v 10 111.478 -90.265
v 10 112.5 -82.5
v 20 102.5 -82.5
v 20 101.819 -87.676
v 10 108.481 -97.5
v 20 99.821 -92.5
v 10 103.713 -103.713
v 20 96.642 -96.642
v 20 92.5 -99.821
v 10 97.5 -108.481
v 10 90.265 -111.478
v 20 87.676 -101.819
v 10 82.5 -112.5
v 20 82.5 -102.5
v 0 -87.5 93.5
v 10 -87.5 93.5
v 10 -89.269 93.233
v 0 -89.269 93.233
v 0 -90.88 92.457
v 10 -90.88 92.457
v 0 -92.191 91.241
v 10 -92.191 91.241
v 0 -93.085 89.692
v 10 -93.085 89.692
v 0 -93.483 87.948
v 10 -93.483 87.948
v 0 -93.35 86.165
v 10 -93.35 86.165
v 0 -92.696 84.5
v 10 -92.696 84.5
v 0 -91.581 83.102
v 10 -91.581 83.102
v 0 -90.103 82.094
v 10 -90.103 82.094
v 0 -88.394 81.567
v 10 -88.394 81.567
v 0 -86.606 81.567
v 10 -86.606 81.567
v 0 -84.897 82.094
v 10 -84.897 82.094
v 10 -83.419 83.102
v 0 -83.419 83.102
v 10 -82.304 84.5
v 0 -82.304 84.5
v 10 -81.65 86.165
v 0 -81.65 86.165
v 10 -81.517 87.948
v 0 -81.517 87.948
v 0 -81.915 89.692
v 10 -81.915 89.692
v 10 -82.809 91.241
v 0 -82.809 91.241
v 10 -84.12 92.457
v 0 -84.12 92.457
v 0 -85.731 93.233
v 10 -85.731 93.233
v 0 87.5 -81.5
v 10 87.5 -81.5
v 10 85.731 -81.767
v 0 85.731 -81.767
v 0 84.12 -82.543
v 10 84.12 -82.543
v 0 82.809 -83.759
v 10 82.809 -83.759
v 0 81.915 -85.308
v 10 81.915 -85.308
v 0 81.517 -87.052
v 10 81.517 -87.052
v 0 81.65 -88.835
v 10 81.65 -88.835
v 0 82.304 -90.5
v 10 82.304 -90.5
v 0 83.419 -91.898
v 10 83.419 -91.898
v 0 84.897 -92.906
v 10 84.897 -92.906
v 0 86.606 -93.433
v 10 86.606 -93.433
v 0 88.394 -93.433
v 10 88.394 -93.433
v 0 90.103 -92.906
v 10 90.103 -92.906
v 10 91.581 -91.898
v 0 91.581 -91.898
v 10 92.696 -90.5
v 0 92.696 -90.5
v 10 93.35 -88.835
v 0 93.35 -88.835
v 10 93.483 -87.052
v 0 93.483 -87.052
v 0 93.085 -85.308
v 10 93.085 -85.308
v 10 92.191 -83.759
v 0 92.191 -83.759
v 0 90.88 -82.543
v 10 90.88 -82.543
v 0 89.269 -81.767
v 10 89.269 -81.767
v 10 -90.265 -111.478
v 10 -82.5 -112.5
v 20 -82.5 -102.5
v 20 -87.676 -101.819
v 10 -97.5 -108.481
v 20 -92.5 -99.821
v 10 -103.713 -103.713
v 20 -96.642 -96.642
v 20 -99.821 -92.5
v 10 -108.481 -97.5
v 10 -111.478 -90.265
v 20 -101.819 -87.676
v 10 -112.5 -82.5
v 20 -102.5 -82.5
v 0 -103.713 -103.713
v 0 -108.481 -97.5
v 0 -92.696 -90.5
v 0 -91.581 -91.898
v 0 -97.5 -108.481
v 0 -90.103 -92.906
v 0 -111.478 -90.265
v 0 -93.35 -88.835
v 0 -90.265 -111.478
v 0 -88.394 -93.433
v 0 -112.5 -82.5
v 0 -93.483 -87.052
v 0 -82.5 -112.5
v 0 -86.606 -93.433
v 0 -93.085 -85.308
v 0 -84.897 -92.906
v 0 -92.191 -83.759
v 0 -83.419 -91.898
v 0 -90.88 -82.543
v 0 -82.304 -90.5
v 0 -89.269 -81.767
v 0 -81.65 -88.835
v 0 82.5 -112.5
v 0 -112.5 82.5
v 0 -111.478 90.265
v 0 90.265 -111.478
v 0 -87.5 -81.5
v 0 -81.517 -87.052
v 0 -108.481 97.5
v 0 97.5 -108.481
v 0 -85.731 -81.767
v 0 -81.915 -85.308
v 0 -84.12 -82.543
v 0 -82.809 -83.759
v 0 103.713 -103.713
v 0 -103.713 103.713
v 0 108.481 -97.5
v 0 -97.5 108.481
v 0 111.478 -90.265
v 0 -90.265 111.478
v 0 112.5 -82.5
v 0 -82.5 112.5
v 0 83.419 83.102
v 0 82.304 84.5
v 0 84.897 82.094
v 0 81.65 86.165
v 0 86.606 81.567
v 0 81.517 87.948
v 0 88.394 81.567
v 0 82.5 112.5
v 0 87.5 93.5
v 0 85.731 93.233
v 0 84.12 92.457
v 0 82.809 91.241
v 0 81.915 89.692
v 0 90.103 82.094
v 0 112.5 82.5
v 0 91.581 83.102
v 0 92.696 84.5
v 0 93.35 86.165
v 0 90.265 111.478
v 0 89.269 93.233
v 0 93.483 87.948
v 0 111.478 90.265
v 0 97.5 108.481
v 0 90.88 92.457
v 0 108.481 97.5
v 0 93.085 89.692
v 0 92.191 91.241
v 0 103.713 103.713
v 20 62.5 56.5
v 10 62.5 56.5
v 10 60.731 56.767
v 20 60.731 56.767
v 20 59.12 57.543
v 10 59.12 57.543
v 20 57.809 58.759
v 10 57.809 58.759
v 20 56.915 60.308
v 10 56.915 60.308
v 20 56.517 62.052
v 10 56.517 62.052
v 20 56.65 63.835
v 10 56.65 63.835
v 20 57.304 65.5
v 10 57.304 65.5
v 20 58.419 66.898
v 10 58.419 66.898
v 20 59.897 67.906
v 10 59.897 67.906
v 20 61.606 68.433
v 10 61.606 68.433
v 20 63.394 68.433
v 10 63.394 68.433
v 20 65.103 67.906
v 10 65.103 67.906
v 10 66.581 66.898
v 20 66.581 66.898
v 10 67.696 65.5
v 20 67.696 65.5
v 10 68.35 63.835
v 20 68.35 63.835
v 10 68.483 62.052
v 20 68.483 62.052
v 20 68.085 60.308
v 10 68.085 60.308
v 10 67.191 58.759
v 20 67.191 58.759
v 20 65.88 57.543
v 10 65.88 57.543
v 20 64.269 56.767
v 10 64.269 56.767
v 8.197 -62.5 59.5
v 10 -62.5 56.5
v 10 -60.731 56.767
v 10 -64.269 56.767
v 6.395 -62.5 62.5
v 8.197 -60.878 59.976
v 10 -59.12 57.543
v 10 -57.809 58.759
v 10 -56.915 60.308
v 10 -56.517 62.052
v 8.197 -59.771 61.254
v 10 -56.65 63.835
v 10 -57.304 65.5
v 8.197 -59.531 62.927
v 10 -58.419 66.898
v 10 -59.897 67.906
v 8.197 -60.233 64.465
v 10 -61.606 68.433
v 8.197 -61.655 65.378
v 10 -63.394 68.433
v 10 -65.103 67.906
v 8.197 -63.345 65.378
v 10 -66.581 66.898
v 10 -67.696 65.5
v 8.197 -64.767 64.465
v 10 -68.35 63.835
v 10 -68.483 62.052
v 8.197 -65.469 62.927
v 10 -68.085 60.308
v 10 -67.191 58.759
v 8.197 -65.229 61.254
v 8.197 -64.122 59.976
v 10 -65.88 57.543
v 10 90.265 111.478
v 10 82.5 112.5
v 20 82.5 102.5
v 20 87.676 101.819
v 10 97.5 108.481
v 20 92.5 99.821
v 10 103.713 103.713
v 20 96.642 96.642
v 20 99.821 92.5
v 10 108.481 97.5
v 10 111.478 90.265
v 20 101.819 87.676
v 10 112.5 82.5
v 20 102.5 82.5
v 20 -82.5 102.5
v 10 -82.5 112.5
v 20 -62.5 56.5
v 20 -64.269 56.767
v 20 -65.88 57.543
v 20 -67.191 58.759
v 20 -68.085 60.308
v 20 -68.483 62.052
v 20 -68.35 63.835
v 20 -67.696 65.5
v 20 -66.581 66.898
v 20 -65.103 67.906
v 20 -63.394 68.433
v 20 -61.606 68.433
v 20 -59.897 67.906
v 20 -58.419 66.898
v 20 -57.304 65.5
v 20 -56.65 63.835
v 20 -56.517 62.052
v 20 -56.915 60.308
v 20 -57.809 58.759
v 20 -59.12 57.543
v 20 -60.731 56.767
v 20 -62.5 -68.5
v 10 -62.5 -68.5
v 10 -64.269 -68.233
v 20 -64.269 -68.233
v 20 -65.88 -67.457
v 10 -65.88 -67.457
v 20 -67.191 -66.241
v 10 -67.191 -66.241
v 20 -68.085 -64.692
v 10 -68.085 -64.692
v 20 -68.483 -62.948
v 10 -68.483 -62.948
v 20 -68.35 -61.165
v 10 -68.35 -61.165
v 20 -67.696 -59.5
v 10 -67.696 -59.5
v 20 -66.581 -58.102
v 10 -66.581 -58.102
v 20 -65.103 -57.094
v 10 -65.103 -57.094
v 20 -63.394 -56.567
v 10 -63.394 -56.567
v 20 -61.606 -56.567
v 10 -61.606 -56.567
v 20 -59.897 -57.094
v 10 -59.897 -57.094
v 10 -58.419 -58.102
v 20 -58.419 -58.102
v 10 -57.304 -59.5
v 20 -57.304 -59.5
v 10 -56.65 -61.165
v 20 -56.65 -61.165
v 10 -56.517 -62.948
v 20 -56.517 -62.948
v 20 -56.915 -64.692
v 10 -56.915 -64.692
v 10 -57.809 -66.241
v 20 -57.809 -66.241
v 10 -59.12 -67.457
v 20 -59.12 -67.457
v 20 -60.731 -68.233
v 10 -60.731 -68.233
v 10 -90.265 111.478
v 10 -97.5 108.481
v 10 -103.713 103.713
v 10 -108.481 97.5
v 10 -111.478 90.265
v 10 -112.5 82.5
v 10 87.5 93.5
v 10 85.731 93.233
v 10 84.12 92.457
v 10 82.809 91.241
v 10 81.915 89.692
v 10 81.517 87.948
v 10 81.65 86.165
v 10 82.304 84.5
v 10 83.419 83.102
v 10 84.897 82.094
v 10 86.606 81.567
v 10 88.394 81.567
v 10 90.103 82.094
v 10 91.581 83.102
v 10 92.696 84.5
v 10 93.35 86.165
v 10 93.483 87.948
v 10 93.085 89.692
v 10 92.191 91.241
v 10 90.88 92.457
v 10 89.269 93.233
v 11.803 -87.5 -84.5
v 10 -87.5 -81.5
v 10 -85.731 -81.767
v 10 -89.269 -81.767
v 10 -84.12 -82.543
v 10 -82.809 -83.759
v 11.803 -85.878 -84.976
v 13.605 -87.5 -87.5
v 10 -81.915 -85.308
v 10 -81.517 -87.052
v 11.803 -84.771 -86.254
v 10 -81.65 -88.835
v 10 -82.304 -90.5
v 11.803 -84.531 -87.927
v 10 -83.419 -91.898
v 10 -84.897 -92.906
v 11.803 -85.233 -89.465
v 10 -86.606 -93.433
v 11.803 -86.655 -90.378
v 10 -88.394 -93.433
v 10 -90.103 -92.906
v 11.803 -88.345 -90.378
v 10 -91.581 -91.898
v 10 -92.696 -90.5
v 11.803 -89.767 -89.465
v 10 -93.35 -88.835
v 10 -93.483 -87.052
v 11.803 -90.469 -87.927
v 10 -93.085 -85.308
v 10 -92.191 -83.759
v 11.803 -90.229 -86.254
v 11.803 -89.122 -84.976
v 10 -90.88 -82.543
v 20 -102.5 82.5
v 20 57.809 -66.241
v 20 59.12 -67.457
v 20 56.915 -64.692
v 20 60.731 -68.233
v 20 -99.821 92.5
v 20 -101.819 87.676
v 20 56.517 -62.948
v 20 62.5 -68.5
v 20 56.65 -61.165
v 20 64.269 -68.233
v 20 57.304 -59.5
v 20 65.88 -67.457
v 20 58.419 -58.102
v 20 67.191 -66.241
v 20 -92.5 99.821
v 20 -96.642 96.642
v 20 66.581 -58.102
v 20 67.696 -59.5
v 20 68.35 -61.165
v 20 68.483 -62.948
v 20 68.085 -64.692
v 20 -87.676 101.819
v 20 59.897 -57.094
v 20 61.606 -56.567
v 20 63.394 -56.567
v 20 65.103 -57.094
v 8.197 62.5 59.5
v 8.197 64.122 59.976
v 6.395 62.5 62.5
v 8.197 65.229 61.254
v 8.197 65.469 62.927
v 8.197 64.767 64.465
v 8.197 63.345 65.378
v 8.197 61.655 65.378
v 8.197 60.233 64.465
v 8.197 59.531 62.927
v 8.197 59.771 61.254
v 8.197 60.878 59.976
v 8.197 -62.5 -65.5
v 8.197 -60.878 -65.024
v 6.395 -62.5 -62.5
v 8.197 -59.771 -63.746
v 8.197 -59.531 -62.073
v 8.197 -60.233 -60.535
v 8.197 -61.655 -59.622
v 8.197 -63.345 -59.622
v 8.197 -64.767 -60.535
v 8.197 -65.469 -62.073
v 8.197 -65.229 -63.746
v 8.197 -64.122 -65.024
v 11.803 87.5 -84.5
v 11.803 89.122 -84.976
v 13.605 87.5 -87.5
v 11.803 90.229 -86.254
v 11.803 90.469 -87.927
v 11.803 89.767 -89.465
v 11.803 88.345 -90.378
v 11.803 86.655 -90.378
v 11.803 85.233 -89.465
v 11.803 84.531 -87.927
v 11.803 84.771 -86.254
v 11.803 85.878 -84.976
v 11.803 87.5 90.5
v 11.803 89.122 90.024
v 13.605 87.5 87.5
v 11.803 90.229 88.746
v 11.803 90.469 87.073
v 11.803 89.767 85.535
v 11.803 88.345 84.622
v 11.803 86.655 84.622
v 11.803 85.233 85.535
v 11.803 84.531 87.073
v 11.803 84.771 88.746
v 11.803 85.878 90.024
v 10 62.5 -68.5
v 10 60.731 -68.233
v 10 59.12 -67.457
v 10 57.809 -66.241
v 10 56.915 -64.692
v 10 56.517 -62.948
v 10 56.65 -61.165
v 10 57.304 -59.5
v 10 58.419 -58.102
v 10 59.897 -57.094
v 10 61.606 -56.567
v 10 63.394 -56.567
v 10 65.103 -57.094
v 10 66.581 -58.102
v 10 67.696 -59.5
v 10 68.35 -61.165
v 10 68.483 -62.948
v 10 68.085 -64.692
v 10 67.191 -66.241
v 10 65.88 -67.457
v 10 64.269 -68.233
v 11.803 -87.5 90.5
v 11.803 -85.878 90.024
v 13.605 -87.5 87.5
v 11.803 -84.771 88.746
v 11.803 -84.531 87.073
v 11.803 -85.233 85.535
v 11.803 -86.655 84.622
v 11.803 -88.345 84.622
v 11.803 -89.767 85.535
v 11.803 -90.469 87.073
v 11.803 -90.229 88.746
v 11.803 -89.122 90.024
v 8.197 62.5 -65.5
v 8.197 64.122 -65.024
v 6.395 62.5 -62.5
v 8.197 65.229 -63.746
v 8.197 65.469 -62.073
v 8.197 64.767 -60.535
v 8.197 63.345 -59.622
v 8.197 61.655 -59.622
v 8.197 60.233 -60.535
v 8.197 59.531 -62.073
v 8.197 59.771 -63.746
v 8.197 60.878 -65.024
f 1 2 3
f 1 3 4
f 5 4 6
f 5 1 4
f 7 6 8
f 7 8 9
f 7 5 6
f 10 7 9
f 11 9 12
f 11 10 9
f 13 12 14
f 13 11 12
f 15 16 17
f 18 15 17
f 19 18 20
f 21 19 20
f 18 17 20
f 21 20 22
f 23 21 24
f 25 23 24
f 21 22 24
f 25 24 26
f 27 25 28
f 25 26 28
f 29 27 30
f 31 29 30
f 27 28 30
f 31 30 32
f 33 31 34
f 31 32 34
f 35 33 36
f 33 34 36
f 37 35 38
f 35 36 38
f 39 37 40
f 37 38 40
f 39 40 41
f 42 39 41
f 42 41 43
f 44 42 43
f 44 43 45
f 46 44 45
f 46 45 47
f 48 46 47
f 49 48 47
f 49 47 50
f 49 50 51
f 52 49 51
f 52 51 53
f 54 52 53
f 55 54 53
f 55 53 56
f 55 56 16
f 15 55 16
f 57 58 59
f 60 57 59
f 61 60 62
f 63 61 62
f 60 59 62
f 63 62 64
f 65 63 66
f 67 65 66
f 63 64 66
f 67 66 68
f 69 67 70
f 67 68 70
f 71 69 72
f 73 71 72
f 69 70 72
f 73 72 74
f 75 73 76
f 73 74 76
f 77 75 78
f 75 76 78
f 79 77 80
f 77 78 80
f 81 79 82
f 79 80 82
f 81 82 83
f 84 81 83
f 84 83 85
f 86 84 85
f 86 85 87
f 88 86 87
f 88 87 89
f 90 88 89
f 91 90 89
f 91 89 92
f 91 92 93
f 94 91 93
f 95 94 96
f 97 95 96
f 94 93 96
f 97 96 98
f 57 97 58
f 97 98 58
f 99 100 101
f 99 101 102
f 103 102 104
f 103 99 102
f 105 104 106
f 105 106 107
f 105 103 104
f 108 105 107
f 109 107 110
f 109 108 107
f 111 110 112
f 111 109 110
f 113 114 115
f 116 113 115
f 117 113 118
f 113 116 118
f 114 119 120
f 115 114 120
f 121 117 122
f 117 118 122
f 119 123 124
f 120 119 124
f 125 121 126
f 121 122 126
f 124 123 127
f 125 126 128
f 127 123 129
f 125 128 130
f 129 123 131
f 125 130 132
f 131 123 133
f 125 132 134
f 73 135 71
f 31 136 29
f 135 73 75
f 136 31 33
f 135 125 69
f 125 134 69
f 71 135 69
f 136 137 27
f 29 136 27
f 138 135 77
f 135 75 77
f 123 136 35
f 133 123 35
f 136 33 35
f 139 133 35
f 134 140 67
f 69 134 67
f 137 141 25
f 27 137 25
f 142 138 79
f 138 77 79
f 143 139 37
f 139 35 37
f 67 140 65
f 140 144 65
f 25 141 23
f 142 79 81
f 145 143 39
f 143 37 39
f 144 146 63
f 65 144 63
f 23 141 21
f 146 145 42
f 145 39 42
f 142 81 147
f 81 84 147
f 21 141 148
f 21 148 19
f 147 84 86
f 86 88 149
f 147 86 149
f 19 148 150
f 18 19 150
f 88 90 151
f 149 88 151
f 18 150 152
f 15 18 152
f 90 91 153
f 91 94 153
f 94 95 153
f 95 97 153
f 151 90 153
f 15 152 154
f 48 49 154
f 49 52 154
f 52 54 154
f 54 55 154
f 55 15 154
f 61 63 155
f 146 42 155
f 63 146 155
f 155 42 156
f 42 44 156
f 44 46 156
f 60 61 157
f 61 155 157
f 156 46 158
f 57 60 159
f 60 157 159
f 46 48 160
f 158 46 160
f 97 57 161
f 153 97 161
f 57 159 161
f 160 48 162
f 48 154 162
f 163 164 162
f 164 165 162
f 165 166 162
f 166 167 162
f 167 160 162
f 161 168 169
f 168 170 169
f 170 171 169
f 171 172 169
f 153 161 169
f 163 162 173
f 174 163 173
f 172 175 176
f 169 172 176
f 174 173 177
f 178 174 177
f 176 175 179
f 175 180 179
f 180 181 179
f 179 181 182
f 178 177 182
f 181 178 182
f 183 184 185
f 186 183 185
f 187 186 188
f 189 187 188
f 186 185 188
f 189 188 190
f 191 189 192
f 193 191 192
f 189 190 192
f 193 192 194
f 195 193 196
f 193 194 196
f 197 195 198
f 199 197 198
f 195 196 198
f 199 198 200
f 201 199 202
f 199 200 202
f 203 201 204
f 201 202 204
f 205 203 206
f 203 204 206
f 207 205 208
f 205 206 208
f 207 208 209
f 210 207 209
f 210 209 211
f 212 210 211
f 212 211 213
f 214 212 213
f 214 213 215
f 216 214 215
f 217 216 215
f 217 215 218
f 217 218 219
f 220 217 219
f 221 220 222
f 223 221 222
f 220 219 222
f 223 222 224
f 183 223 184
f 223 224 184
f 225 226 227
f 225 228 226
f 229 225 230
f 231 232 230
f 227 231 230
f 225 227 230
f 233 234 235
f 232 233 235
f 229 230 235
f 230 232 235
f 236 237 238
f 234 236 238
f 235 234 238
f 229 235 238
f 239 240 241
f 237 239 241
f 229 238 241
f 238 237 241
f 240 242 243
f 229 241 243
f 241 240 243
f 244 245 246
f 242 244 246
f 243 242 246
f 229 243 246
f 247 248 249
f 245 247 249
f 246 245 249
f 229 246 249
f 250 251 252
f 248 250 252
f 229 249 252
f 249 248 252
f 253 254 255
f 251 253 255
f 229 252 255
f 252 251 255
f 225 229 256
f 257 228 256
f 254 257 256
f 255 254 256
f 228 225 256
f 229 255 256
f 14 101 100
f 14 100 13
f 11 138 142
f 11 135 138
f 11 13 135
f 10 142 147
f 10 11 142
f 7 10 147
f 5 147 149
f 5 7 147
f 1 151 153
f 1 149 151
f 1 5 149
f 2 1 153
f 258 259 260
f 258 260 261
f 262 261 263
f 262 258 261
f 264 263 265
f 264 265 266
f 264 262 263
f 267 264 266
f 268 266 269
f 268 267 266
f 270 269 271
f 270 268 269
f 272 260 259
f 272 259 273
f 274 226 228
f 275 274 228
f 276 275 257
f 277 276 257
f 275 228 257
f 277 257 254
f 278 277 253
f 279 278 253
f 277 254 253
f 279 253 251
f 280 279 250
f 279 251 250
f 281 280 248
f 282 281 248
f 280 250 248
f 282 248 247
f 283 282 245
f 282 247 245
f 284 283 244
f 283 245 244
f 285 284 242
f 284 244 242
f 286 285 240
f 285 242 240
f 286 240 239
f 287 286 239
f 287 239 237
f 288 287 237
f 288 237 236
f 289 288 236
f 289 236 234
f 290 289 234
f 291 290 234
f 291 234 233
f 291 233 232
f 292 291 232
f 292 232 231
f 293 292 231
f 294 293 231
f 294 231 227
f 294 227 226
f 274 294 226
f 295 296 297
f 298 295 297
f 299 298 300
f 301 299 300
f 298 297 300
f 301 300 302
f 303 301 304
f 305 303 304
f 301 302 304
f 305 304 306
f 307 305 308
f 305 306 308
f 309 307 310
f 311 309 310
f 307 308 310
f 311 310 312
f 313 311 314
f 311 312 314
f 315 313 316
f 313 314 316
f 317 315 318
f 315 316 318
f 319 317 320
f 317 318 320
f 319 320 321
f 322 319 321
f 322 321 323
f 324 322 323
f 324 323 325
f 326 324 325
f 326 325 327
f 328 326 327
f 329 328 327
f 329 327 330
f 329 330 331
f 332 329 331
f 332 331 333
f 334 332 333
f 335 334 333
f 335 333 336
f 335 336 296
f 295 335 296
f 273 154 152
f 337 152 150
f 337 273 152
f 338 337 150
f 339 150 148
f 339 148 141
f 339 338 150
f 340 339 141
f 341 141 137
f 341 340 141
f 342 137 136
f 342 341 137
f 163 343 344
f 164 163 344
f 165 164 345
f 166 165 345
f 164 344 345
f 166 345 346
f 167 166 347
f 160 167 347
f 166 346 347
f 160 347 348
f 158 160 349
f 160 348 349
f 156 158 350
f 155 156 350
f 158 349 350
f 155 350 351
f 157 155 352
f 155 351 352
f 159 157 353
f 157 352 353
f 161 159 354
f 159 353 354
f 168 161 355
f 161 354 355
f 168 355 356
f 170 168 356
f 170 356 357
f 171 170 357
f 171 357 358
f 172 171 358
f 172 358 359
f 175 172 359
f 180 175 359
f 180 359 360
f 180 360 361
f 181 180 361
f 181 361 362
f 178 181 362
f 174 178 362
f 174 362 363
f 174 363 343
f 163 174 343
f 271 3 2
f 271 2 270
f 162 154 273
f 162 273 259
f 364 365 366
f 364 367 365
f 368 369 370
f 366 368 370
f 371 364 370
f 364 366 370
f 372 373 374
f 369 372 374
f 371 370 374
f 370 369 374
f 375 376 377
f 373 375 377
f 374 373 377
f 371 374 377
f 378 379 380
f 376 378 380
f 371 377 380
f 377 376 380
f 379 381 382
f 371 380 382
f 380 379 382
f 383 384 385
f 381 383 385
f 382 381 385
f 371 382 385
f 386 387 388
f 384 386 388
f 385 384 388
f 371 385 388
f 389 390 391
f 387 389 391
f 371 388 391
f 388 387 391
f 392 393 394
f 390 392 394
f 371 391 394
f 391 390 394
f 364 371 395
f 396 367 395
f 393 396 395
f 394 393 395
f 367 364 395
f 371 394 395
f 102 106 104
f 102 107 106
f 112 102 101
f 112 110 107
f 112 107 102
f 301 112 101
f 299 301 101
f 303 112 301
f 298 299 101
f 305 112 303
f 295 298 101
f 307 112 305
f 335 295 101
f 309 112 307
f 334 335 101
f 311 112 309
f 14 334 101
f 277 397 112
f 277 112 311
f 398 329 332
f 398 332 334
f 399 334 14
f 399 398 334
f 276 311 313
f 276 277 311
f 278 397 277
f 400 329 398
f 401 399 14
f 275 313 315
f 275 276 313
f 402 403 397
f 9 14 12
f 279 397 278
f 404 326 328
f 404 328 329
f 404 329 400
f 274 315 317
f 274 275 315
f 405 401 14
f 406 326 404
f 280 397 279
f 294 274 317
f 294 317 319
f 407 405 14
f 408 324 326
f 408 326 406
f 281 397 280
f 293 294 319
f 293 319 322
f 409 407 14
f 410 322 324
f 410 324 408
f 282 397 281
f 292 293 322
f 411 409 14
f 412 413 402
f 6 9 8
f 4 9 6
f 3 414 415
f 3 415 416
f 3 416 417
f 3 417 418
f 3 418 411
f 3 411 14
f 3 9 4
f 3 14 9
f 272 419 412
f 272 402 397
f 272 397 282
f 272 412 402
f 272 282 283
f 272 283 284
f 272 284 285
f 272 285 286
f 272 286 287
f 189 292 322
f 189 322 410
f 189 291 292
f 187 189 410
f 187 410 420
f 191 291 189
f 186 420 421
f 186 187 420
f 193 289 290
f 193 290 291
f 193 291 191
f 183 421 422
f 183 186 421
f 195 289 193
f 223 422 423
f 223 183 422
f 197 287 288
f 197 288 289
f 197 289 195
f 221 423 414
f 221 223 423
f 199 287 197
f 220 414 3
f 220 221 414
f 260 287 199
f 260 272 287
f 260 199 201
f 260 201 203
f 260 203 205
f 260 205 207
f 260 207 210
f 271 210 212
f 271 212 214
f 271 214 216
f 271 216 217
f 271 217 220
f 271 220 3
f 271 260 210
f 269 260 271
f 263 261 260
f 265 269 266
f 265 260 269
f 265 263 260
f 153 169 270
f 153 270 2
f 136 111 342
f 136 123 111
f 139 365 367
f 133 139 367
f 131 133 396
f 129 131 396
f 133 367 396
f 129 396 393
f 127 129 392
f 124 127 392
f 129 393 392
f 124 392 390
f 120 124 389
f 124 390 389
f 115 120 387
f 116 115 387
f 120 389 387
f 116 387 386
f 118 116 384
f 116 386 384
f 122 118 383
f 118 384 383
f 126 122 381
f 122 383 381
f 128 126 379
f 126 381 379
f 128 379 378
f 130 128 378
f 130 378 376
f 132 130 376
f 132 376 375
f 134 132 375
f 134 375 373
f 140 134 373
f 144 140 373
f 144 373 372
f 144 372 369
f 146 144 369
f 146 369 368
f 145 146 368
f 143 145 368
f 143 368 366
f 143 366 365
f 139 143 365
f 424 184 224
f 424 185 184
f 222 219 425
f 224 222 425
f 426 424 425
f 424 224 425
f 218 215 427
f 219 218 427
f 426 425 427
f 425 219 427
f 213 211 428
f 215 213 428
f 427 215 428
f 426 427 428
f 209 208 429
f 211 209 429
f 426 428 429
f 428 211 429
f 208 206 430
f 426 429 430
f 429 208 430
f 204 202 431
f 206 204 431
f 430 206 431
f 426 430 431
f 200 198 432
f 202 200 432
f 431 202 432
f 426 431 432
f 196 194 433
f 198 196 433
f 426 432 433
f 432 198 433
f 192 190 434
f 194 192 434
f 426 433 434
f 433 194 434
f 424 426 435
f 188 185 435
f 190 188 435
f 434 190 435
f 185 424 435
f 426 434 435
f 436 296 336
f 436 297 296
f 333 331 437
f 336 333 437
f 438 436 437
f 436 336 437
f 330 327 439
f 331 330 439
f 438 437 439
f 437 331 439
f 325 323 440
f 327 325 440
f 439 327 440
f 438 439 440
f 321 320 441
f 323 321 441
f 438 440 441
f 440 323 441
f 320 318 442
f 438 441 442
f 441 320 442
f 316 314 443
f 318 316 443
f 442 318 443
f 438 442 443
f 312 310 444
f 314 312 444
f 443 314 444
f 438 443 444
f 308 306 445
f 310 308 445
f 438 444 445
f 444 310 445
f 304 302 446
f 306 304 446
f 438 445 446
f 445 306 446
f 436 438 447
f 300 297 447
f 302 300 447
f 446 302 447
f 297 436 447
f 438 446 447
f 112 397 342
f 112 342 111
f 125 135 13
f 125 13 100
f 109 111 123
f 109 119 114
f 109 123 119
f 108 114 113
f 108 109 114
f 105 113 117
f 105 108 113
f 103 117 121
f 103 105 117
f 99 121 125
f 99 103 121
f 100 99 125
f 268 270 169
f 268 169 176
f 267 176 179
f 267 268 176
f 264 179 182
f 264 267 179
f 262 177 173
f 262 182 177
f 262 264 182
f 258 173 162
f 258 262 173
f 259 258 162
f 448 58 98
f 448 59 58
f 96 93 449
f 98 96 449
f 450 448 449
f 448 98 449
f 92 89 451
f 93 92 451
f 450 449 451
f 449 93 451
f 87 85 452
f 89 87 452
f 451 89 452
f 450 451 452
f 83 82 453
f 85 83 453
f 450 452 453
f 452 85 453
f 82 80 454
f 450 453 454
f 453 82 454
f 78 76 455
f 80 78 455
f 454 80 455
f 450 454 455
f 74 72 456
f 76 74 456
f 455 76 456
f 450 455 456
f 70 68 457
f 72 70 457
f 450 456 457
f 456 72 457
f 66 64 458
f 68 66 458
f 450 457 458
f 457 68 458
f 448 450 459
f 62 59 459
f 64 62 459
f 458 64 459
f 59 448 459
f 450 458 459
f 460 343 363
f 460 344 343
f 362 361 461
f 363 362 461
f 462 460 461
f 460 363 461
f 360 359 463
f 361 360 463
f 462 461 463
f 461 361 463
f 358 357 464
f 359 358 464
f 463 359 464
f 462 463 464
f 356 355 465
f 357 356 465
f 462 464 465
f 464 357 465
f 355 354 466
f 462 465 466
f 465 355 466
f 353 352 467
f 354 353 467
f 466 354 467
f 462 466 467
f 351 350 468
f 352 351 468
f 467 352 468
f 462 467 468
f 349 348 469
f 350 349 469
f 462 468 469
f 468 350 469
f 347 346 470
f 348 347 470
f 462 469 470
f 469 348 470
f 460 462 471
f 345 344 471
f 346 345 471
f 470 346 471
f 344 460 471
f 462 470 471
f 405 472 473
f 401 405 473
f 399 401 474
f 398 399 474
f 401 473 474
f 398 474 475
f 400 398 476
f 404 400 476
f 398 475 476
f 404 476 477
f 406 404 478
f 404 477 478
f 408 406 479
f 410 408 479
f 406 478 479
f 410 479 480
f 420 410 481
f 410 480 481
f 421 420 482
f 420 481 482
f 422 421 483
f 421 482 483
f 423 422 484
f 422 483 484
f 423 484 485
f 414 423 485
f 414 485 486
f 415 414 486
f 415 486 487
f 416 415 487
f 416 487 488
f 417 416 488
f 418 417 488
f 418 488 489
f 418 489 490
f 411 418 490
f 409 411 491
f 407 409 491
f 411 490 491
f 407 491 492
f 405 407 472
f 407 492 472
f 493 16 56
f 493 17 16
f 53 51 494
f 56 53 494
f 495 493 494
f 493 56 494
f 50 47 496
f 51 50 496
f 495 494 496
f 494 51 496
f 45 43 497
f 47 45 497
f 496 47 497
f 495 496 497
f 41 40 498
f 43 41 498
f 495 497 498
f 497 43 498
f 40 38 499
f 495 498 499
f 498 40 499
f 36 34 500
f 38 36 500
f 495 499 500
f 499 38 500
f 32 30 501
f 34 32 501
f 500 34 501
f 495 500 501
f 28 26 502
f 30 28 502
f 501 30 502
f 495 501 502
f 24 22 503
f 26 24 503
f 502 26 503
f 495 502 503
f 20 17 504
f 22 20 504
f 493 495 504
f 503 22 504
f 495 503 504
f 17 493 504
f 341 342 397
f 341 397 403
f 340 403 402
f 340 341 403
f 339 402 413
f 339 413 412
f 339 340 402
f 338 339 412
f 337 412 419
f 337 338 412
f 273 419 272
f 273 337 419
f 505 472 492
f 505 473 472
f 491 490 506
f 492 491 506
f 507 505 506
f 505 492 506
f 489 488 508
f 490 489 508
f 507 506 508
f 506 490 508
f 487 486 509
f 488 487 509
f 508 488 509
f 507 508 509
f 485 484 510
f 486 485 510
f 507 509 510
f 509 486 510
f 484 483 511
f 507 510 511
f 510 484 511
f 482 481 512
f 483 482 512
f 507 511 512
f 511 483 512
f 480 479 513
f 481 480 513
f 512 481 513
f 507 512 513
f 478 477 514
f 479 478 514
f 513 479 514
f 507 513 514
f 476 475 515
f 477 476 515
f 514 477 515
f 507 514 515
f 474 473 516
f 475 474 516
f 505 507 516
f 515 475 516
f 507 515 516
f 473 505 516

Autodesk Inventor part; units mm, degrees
ref_plane "YZ Plane" through (0, 0, 0) normal (1, 0, 0) x (0, 1, 0)
ref_plane "XZ Plane" through (0, 0, 0) normal (0, 1, 0) x (-1, 0, 0)
ref_plane "XY Plane" through (0, 0, 0) normal (0, 0, 1) x (1, 0, 0)
sketch "草圖1" plane through (0, 0, 0) normal (1, 0, 0) x (0, 1, 0)
  line L0 (-112.5, 112.5) -> (112.5, 112.5)
  line L1 (112.5, 112.5) -> (112.5, -112.5)
  line L2 (112.5, -112.5) -> (-112.5, -112.5)
  line L3 (-112.5, -112.5) -> (-112.5, 112.5)
  line L4 (-112.5, 112.5) -> (112.5, -112.5) construction
  line L5 (112.5, 112.5) -> (-112.5, -112.5) construction
  point P0 (0, 0)
  dimension "d0" = 225
  dimension "d1" = 225
extrude "擠出1" add sketch "草圖1" along normal blind 20
fillet "圓角1" radius 30 4 edges at (10, 112.5, 112.5) (10, -112.5, 112.5) (10, 112.5, -112.5) (10, -112.5, -112.5)
chamfer "倒角1" distance 10 angle 45 8 edges at (20, 0, 112.5) (20, -103.7132, 103.7132) (20, -112.5, 0) (20, -103.7132, -103.7132) (20, 0, -112.5) (20, 103.7132, -103.7132) (20, 112.5, 0) (20, 103.7132, 103.7132)
sketch "草圖2" plane through (20, 0, 0) normal (1, 0, 0) x (0, 0, -1)
  line L0 (-62.5, -62.5) -> (62.5, -62.5)
  line L1 (62.5, -62.5) -> (62.5, 62.5)
  line L2 (62.5, 62.5) -> (-62.5, 62.5)
  line L3 (-62.5, 62.5) -> (-62.5, -62.5)
  line L4 (-62.5, -62.5) -> (62.5, 62.5) construction
  line L5 (62.5, -62.5) -> (-62.5, 62.5) construction
  point P0 (0, 0)
  dimension "d8" = 125
  dimension "d9" = 125
hole "孔1" at (20, 62.5, 62.5) at (20, 62.5, -62.5) at (20, -62.5, 62.5) at (20, -62.5, -62.5) direction (-1, 0, 0) diameter 12 depth 10 tip angle 118
sketch "草圖3" plane through (0, 0, 0) normal (-1, 0, 0) x (0, 0, 1)
  arc A0 (-112.5, -82.5) -> (-82.5, -112.5) centre (-82.5, -82.5) ccw projected
  line L0 (-82.5, -112.5) -> (82.5, -112.5) projected
  arc A1 (82.5, -112.5) -> (112.5, -82.5) centre (82.5, -82.5) ccw projected
  line L1 (112.5, -82.5) -> (112.5, 82.5) projected
  arc A2 (112.5, 82.5) -> (82.5, 112.5) centre (82.5, 82.5) ccw projected
  line L2 (82.5, 112.5) -> (-82.5, 112.5) projected
  arc A3 (-82.5, 112.5) -> (-112.5, 82.5) centre (-82.5, 82.5) ccw projected
  line L3 (-112.5, 82.5) -> (-112.5, -82.5) projected
  line L4 (87.5, 87.5) -> (-87.5, 87.5)
  line L5 (-87.5, 87.5) -> (-87.5, -87.5)
  line L6 (-87.5, -87.5) -> (87.5, -87.5)
  line L7 (87.5, -87.5) -> (87.5, 87.5)
  line L8 (87.5, 87.5) -> (-87.5, -87.5) construction
  line L9 (-87.5, 87.5) -> (87.5, -87.5) construction
  point P0 (0, 0)
  dimension "d17" = 175
  dimension "d18" = 175
hole "孔2" at (0, -87.5, 87.5) at (0, -87.5, -87.5) at (0, 87.5, -87.5) at (0, 87.5, 87.5) direction (1, 0, 0) diameter 12 depth 10 tip angle 118
properties part number "exercise3-1-3"
